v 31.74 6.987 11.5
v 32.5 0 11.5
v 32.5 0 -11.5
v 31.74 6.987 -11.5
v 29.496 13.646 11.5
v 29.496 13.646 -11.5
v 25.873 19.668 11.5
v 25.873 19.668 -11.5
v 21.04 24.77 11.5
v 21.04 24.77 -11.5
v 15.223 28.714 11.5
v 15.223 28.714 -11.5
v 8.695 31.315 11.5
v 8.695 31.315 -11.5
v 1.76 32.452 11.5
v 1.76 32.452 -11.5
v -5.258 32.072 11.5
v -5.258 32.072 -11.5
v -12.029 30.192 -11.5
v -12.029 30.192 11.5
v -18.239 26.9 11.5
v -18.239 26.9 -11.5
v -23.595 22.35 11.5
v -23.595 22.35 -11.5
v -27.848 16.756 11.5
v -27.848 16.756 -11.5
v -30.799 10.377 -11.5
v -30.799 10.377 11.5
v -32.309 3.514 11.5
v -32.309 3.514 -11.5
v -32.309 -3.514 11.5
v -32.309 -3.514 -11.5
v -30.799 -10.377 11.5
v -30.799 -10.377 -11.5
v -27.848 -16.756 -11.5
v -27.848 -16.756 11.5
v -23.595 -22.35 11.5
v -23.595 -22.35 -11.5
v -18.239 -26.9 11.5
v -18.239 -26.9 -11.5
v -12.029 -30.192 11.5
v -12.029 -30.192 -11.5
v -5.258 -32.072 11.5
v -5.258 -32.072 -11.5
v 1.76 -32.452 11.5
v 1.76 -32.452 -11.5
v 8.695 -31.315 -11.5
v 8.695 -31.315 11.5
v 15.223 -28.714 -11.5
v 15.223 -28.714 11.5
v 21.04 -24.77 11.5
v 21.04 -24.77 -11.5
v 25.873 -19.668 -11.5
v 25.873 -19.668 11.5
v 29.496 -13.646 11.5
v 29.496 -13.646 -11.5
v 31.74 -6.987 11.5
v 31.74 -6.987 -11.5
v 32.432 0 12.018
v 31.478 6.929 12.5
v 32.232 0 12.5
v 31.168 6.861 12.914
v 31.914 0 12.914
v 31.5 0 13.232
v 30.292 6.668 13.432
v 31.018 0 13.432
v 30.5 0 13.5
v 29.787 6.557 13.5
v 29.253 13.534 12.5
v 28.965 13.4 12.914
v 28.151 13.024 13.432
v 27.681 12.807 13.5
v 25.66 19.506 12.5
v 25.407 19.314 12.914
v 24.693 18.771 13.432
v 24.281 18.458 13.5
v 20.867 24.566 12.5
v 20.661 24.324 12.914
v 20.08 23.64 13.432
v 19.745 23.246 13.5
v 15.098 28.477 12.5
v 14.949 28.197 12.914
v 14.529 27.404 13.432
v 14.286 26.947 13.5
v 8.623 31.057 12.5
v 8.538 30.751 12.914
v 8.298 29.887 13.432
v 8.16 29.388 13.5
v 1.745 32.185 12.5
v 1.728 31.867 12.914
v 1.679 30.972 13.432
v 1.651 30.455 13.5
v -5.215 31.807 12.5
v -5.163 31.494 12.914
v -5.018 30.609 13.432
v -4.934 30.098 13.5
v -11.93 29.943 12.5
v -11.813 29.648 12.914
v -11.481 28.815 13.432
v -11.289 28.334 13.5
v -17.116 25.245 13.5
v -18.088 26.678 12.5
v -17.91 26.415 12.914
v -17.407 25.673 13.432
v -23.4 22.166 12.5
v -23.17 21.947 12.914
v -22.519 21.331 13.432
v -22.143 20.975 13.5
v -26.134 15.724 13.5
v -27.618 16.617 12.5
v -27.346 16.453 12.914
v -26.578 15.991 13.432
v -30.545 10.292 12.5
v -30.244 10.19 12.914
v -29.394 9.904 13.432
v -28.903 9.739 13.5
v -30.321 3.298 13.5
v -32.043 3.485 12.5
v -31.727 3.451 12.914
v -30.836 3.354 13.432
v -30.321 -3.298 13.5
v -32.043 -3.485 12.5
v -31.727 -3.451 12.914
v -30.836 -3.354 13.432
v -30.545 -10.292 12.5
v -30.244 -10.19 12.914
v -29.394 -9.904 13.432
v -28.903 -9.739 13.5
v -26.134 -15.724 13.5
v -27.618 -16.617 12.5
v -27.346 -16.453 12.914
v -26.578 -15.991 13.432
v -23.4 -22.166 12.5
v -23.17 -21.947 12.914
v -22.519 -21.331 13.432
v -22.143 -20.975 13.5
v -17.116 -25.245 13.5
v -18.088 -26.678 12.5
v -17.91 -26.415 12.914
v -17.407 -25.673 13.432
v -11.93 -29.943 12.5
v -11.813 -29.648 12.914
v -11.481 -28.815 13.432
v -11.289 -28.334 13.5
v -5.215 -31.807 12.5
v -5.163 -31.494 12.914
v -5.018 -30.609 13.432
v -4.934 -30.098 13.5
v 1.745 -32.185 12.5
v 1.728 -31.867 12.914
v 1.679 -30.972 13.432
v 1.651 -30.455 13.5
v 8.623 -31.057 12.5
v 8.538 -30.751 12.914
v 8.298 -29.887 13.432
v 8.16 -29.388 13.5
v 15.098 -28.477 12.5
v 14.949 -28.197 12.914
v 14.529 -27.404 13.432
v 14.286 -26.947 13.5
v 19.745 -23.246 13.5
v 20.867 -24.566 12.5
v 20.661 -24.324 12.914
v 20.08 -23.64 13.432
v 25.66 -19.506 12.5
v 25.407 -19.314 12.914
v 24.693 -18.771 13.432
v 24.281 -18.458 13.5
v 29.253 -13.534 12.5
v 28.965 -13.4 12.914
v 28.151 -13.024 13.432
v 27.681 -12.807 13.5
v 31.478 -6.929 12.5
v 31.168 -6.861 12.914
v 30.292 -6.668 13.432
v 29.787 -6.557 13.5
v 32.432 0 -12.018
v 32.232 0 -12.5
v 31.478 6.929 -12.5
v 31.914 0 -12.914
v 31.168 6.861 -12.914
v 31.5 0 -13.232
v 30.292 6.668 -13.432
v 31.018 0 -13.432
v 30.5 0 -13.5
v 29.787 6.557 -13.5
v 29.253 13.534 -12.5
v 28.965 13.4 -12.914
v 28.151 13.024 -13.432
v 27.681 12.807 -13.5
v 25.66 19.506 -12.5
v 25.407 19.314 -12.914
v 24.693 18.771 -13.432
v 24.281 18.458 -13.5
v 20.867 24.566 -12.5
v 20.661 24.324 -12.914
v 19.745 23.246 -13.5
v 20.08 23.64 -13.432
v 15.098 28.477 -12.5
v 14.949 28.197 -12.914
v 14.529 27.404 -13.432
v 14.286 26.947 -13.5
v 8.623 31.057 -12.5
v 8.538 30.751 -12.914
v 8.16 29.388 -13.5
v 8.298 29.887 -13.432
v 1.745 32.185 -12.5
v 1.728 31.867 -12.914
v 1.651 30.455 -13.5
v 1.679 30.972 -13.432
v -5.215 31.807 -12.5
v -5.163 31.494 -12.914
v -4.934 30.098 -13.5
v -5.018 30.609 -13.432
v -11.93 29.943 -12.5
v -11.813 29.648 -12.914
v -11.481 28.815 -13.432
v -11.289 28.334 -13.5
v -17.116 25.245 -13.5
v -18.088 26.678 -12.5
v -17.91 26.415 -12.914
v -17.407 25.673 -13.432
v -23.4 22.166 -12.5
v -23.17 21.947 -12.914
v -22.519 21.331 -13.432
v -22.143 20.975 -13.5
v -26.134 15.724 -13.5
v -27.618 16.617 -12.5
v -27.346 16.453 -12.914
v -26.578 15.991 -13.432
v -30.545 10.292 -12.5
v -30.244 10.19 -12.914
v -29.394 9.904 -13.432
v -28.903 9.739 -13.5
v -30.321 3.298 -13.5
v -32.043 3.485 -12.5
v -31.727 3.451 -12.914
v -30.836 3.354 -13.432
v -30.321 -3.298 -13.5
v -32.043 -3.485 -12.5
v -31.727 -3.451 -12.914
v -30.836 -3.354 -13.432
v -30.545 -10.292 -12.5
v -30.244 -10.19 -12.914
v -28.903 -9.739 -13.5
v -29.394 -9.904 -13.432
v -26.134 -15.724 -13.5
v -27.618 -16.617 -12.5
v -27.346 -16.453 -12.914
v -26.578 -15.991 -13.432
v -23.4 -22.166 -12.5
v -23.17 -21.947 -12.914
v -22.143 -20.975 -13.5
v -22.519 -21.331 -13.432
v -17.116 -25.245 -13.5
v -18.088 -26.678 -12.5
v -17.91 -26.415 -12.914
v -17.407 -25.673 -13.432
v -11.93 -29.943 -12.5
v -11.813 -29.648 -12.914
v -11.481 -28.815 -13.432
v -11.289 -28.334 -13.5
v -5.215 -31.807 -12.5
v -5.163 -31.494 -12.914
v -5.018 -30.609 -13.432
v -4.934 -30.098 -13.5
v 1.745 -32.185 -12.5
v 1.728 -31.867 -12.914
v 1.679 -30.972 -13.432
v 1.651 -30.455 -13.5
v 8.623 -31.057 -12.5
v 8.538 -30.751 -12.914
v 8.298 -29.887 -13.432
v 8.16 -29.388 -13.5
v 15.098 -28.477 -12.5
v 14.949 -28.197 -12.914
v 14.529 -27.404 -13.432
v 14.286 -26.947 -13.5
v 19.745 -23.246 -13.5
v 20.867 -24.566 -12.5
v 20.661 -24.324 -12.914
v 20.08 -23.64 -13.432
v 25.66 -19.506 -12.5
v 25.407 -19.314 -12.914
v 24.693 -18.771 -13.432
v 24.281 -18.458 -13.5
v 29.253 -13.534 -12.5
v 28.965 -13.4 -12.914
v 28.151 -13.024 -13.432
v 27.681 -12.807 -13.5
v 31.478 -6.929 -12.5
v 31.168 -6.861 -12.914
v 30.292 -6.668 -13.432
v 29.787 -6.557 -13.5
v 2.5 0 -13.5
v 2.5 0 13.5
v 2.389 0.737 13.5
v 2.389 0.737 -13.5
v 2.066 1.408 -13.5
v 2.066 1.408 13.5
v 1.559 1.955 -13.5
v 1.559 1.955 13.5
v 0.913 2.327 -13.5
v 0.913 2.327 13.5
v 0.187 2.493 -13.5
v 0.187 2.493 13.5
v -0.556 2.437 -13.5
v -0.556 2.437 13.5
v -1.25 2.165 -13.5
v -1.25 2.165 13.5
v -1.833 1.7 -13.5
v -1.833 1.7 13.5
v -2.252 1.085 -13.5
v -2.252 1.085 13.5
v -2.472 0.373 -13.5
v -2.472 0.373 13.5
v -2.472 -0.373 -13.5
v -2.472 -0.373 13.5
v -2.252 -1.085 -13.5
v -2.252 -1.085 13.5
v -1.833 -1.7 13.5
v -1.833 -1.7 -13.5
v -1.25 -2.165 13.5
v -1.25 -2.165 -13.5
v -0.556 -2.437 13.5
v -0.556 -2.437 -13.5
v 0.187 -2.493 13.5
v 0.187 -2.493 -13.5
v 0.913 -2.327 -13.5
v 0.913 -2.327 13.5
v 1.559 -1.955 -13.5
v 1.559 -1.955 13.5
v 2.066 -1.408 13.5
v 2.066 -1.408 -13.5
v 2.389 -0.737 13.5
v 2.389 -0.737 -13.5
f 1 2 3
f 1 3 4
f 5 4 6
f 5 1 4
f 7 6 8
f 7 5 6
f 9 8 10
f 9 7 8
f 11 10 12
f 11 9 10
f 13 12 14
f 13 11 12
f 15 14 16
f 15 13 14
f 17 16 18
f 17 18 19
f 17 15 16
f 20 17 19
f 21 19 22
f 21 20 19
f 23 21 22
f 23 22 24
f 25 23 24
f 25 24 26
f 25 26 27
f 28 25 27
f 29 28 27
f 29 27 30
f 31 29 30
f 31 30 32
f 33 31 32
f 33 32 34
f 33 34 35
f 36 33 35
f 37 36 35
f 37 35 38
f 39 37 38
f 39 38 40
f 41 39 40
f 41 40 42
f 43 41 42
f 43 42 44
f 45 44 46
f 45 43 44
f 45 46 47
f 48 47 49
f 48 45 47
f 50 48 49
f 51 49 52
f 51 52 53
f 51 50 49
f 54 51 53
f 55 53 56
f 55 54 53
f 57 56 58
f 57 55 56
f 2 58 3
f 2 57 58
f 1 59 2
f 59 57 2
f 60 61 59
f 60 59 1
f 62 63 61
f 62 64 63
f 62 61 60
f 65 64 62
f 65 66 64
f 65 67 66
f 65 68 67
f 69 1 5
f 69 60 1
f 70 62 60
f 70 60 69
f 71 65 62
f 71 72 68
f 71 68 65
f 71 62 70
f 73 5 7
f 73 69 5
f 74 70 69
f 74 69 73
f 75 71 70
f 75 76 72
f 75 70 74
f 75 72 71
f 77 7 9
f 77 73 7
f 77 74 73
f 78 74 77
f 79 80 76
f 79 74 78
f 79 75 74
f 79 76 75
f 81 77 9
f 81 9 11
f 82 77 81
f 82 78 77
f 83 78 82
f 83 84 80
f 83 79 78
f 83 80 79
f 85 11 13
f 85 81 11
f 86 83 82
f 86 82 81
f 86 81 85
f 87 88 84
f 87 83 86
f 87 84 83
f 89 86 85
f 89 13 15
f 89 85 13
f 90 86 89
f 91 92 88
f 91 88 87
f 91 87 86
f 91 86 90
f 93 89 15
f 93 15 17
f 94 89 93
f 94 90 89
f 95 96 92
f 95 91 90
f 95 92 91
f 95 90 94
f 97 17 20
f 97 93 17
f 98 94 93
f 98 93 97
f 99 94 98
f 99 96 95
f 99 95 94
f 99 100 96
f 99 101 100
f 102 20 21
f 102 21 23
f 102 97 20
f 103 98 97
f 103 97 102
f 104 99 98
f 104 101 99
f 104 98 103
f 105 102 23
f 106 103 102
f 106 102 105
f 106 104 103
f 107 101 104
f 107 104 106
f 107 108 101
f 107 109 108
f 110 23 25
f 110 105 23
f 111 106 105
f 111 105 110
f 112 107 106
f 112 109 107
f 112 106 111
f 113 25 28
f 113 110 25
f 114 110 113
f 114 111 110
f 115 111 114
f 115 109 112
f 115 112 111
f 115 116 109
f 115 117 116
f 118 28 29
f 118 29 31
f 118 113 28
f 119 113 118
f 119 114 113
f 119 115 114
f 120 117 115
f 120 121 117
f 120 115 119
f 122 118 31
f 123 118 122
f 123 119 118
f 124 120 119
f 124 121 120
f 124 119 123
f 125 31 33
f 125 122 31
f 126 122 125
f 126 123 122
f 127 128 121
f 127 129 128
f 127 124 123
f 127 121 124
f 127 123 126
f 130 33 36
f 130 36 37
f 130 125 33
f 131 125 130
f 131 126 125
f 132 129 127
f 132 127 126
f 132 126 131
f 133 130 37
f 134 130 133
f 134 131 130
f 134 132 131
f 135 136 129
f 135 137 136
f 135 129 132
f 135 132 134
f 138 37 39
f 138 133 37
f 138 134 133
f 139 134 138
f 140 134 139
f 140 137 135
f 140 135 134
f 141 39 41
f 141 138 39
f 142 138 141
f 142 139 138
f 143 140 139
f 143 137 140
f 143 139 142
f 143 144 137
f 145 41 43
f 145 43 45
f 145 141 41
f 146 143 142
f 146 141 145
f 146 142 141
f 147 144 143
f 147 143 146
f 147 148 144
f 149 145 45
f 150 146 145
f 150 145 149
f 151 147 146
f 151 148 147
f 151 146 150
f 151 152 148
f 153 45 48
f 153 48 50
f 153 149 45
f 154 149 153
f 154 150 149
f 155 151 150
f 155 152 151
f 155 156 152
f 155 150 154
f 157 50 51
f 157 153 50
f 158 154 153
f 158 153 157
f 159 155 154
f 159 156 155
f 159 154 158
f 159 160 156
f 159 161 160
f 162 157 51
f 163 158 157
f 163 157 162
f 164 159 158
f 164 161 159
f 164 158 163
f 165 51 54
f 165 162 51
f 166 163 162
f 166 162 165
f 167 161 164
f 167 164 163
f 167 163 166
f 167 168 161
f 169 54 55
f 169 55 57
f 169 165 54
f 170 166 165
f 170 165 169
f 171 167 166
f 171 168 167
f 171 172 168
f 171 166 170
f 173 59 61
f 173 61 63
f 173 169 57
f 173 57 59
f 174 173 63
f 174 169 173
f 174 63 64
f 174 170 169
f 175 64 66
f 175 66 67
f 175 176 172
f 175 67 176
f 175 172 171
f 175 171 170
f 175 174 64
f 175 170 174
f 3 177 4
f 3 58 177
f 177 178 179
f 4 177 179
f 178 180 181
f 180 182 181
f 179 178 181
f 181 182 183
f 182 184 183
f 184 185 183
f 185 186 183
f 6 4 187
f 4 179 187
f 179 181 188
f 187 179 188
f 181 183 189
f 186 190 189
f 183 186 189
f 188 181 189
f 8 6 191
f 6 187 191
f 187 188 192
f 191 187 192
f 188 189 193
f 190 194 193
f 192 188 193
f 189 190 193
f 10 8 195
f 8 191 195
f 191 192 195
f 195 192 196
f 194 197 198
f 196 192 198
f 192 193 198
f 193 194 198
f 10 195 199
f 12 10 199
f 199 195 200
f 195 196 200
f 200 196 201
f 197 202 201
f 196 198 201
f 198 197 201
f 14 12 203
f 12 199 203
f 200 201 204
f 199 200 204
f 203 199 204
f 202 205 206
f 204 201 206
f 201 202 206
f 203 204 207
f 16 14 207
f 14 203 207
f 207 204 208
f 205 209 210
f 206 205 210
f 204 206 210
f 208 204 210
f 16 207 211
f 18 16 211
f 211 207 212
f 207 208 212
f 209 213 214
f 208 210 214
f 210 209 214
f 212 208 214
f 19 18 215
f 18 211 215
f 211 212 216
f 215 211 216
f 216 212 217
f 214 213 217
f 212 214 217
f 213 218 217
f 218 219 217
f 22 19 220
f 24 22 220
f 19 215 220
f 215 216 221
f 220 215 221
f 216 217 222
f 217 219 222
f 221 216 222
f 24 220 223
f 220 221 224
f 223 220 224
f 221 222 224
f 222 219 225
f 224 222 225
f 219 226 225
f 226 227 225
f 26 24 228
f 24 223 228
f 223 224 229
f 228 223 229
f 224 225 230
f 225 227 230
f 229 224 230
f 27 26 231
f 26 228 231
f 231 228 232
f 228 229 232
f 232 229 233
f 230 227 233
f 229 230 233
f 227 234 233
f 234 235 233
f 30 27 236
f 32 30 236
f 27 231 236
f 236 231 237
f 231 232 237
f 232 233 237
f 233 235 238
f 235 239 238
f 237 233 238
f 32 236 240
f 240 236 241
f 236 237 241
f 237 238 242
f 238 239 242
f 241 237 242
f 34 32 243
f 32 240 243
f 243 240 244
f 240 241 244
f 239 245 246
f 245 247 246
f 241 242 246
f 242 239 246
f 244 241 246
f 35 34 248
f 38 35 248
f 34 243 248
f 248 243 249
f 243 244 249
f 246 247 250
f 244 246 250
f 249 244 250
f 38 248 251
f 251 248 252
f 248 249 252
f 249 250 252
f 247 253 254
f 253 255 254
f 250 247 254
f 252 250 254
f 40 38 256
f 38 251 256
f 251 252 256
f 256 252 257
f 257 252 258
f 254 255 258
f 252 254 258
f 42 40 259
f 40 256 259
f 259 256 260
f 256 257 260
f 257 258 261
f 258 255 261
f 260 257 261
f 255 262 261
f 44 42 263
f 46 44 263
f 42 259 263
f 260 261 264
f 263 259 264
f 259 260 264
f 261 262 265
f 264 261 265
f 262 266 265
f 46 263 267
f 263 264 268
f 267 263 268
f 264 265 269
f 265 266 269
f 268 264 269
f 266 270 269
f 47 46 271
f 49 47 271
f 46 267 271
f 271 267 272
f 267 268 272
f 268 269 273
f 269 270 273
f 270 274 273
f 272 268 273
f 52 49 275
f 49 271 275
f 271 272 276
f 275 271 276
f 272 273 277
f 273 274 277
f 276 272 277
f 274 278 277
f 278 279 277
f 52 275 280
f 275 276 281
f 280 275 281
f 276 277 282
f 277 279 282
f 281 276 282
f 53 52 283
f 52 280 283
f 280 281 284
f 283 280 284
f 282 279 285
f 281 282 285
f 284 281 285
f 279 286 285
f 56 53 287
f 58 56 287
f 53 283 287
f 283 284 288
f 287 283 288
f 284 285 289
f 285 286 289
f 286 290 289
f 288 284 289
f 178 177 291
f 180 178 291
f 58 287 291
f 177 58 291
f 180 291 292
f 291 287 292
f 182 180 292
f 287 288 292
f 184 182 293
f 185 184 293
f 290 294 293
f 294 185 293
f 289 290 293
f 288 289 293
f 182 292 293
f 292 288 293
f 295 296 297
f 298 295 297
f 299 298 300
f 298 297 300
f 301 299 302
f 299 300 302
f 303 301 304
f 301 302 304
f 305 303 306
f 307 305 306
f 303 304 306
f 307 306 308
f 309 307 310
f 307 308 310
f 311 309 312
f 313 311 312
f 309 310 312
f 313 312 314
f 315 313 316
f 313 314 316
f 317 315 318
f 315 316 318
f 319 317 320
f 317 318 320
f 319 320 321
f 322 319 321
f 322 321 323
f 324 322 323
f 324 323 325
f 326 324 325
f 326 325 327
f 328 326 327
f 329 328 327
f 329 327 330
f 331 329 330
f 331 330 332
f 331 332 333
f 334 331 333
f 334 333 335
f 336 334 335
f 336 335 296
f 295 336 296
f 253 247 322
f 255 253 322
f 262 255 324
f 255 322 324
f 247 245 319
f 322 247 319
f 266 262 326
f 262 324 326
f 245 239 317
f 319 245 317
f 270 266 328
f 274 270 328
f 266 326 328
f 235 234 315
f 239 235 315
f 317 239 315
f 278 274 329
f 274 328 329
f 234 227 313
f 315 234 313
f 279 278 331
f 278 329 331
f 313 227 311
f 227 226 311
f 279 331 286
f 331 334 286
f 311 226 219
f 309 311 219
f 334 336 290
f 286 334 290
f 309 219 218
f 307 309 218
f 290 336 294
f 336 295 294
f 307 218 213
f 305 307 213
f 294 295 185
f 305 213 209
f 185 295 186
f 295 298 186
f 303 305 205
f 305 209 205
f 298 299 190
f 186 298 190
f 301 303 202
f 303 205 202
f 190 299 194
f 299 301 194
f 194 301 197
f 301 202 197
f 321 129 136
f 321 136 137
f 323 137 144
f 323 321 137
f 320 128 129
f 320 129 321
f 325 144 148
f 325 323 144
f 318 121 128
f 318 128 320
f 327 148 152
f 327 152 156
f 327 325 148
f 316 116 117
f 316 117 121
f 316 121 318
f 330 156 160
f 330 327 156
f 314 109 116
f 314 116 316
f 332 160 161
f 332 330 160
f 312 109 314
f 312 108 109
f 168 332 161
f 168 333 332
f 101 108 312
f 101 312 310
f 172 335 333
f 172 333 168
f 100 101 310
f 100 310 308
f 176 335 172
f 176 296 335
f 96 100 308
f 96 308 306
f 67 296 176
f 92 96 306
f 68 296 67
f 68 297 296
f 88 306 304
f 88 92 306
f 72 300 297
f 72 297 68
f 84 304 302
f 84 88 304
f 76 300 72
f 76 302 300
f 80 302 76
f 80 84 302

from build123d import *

# Parameters (mm, degrees)
SKETCH1_R           = 32.5
BOSS_EXTRUDE1_DEPTH = 13.5
FILLET1_R           = 2
SKETCH2_R           = 2.5
CUT_EXTRUDE1_DEPTH  = 28


with BuildPart() as part:
    # Sketch1 → Boss-Extrude1 (new body, symmetric)
    with BuildSketch(Plane.XY):
        Circle(SKETCH1_R)
    extrude(amount=BOSS_EXTRUDE1_DEPTH, both=True)

    # Fillet1
    fillet1_edges = [part.edges().sort_by_distance(p)[0] for p in [
        (-32.5, 0, -13.5),
        (-32.5, 0, 13.5),
    ]]
    fillet(fillet1_edges, radius=FILLET1_R)

    # Sketch2 → Cut-Extrude1 (cut, through all)
    with BuildSketch(Plane.XY.offset(13.5)):
        Circle(SKETCH2_R)
    extrude(amount=-CUT_EXTRUDE1_DEPTH, mode=Mode.SUBTRACT)


solid = part.part
